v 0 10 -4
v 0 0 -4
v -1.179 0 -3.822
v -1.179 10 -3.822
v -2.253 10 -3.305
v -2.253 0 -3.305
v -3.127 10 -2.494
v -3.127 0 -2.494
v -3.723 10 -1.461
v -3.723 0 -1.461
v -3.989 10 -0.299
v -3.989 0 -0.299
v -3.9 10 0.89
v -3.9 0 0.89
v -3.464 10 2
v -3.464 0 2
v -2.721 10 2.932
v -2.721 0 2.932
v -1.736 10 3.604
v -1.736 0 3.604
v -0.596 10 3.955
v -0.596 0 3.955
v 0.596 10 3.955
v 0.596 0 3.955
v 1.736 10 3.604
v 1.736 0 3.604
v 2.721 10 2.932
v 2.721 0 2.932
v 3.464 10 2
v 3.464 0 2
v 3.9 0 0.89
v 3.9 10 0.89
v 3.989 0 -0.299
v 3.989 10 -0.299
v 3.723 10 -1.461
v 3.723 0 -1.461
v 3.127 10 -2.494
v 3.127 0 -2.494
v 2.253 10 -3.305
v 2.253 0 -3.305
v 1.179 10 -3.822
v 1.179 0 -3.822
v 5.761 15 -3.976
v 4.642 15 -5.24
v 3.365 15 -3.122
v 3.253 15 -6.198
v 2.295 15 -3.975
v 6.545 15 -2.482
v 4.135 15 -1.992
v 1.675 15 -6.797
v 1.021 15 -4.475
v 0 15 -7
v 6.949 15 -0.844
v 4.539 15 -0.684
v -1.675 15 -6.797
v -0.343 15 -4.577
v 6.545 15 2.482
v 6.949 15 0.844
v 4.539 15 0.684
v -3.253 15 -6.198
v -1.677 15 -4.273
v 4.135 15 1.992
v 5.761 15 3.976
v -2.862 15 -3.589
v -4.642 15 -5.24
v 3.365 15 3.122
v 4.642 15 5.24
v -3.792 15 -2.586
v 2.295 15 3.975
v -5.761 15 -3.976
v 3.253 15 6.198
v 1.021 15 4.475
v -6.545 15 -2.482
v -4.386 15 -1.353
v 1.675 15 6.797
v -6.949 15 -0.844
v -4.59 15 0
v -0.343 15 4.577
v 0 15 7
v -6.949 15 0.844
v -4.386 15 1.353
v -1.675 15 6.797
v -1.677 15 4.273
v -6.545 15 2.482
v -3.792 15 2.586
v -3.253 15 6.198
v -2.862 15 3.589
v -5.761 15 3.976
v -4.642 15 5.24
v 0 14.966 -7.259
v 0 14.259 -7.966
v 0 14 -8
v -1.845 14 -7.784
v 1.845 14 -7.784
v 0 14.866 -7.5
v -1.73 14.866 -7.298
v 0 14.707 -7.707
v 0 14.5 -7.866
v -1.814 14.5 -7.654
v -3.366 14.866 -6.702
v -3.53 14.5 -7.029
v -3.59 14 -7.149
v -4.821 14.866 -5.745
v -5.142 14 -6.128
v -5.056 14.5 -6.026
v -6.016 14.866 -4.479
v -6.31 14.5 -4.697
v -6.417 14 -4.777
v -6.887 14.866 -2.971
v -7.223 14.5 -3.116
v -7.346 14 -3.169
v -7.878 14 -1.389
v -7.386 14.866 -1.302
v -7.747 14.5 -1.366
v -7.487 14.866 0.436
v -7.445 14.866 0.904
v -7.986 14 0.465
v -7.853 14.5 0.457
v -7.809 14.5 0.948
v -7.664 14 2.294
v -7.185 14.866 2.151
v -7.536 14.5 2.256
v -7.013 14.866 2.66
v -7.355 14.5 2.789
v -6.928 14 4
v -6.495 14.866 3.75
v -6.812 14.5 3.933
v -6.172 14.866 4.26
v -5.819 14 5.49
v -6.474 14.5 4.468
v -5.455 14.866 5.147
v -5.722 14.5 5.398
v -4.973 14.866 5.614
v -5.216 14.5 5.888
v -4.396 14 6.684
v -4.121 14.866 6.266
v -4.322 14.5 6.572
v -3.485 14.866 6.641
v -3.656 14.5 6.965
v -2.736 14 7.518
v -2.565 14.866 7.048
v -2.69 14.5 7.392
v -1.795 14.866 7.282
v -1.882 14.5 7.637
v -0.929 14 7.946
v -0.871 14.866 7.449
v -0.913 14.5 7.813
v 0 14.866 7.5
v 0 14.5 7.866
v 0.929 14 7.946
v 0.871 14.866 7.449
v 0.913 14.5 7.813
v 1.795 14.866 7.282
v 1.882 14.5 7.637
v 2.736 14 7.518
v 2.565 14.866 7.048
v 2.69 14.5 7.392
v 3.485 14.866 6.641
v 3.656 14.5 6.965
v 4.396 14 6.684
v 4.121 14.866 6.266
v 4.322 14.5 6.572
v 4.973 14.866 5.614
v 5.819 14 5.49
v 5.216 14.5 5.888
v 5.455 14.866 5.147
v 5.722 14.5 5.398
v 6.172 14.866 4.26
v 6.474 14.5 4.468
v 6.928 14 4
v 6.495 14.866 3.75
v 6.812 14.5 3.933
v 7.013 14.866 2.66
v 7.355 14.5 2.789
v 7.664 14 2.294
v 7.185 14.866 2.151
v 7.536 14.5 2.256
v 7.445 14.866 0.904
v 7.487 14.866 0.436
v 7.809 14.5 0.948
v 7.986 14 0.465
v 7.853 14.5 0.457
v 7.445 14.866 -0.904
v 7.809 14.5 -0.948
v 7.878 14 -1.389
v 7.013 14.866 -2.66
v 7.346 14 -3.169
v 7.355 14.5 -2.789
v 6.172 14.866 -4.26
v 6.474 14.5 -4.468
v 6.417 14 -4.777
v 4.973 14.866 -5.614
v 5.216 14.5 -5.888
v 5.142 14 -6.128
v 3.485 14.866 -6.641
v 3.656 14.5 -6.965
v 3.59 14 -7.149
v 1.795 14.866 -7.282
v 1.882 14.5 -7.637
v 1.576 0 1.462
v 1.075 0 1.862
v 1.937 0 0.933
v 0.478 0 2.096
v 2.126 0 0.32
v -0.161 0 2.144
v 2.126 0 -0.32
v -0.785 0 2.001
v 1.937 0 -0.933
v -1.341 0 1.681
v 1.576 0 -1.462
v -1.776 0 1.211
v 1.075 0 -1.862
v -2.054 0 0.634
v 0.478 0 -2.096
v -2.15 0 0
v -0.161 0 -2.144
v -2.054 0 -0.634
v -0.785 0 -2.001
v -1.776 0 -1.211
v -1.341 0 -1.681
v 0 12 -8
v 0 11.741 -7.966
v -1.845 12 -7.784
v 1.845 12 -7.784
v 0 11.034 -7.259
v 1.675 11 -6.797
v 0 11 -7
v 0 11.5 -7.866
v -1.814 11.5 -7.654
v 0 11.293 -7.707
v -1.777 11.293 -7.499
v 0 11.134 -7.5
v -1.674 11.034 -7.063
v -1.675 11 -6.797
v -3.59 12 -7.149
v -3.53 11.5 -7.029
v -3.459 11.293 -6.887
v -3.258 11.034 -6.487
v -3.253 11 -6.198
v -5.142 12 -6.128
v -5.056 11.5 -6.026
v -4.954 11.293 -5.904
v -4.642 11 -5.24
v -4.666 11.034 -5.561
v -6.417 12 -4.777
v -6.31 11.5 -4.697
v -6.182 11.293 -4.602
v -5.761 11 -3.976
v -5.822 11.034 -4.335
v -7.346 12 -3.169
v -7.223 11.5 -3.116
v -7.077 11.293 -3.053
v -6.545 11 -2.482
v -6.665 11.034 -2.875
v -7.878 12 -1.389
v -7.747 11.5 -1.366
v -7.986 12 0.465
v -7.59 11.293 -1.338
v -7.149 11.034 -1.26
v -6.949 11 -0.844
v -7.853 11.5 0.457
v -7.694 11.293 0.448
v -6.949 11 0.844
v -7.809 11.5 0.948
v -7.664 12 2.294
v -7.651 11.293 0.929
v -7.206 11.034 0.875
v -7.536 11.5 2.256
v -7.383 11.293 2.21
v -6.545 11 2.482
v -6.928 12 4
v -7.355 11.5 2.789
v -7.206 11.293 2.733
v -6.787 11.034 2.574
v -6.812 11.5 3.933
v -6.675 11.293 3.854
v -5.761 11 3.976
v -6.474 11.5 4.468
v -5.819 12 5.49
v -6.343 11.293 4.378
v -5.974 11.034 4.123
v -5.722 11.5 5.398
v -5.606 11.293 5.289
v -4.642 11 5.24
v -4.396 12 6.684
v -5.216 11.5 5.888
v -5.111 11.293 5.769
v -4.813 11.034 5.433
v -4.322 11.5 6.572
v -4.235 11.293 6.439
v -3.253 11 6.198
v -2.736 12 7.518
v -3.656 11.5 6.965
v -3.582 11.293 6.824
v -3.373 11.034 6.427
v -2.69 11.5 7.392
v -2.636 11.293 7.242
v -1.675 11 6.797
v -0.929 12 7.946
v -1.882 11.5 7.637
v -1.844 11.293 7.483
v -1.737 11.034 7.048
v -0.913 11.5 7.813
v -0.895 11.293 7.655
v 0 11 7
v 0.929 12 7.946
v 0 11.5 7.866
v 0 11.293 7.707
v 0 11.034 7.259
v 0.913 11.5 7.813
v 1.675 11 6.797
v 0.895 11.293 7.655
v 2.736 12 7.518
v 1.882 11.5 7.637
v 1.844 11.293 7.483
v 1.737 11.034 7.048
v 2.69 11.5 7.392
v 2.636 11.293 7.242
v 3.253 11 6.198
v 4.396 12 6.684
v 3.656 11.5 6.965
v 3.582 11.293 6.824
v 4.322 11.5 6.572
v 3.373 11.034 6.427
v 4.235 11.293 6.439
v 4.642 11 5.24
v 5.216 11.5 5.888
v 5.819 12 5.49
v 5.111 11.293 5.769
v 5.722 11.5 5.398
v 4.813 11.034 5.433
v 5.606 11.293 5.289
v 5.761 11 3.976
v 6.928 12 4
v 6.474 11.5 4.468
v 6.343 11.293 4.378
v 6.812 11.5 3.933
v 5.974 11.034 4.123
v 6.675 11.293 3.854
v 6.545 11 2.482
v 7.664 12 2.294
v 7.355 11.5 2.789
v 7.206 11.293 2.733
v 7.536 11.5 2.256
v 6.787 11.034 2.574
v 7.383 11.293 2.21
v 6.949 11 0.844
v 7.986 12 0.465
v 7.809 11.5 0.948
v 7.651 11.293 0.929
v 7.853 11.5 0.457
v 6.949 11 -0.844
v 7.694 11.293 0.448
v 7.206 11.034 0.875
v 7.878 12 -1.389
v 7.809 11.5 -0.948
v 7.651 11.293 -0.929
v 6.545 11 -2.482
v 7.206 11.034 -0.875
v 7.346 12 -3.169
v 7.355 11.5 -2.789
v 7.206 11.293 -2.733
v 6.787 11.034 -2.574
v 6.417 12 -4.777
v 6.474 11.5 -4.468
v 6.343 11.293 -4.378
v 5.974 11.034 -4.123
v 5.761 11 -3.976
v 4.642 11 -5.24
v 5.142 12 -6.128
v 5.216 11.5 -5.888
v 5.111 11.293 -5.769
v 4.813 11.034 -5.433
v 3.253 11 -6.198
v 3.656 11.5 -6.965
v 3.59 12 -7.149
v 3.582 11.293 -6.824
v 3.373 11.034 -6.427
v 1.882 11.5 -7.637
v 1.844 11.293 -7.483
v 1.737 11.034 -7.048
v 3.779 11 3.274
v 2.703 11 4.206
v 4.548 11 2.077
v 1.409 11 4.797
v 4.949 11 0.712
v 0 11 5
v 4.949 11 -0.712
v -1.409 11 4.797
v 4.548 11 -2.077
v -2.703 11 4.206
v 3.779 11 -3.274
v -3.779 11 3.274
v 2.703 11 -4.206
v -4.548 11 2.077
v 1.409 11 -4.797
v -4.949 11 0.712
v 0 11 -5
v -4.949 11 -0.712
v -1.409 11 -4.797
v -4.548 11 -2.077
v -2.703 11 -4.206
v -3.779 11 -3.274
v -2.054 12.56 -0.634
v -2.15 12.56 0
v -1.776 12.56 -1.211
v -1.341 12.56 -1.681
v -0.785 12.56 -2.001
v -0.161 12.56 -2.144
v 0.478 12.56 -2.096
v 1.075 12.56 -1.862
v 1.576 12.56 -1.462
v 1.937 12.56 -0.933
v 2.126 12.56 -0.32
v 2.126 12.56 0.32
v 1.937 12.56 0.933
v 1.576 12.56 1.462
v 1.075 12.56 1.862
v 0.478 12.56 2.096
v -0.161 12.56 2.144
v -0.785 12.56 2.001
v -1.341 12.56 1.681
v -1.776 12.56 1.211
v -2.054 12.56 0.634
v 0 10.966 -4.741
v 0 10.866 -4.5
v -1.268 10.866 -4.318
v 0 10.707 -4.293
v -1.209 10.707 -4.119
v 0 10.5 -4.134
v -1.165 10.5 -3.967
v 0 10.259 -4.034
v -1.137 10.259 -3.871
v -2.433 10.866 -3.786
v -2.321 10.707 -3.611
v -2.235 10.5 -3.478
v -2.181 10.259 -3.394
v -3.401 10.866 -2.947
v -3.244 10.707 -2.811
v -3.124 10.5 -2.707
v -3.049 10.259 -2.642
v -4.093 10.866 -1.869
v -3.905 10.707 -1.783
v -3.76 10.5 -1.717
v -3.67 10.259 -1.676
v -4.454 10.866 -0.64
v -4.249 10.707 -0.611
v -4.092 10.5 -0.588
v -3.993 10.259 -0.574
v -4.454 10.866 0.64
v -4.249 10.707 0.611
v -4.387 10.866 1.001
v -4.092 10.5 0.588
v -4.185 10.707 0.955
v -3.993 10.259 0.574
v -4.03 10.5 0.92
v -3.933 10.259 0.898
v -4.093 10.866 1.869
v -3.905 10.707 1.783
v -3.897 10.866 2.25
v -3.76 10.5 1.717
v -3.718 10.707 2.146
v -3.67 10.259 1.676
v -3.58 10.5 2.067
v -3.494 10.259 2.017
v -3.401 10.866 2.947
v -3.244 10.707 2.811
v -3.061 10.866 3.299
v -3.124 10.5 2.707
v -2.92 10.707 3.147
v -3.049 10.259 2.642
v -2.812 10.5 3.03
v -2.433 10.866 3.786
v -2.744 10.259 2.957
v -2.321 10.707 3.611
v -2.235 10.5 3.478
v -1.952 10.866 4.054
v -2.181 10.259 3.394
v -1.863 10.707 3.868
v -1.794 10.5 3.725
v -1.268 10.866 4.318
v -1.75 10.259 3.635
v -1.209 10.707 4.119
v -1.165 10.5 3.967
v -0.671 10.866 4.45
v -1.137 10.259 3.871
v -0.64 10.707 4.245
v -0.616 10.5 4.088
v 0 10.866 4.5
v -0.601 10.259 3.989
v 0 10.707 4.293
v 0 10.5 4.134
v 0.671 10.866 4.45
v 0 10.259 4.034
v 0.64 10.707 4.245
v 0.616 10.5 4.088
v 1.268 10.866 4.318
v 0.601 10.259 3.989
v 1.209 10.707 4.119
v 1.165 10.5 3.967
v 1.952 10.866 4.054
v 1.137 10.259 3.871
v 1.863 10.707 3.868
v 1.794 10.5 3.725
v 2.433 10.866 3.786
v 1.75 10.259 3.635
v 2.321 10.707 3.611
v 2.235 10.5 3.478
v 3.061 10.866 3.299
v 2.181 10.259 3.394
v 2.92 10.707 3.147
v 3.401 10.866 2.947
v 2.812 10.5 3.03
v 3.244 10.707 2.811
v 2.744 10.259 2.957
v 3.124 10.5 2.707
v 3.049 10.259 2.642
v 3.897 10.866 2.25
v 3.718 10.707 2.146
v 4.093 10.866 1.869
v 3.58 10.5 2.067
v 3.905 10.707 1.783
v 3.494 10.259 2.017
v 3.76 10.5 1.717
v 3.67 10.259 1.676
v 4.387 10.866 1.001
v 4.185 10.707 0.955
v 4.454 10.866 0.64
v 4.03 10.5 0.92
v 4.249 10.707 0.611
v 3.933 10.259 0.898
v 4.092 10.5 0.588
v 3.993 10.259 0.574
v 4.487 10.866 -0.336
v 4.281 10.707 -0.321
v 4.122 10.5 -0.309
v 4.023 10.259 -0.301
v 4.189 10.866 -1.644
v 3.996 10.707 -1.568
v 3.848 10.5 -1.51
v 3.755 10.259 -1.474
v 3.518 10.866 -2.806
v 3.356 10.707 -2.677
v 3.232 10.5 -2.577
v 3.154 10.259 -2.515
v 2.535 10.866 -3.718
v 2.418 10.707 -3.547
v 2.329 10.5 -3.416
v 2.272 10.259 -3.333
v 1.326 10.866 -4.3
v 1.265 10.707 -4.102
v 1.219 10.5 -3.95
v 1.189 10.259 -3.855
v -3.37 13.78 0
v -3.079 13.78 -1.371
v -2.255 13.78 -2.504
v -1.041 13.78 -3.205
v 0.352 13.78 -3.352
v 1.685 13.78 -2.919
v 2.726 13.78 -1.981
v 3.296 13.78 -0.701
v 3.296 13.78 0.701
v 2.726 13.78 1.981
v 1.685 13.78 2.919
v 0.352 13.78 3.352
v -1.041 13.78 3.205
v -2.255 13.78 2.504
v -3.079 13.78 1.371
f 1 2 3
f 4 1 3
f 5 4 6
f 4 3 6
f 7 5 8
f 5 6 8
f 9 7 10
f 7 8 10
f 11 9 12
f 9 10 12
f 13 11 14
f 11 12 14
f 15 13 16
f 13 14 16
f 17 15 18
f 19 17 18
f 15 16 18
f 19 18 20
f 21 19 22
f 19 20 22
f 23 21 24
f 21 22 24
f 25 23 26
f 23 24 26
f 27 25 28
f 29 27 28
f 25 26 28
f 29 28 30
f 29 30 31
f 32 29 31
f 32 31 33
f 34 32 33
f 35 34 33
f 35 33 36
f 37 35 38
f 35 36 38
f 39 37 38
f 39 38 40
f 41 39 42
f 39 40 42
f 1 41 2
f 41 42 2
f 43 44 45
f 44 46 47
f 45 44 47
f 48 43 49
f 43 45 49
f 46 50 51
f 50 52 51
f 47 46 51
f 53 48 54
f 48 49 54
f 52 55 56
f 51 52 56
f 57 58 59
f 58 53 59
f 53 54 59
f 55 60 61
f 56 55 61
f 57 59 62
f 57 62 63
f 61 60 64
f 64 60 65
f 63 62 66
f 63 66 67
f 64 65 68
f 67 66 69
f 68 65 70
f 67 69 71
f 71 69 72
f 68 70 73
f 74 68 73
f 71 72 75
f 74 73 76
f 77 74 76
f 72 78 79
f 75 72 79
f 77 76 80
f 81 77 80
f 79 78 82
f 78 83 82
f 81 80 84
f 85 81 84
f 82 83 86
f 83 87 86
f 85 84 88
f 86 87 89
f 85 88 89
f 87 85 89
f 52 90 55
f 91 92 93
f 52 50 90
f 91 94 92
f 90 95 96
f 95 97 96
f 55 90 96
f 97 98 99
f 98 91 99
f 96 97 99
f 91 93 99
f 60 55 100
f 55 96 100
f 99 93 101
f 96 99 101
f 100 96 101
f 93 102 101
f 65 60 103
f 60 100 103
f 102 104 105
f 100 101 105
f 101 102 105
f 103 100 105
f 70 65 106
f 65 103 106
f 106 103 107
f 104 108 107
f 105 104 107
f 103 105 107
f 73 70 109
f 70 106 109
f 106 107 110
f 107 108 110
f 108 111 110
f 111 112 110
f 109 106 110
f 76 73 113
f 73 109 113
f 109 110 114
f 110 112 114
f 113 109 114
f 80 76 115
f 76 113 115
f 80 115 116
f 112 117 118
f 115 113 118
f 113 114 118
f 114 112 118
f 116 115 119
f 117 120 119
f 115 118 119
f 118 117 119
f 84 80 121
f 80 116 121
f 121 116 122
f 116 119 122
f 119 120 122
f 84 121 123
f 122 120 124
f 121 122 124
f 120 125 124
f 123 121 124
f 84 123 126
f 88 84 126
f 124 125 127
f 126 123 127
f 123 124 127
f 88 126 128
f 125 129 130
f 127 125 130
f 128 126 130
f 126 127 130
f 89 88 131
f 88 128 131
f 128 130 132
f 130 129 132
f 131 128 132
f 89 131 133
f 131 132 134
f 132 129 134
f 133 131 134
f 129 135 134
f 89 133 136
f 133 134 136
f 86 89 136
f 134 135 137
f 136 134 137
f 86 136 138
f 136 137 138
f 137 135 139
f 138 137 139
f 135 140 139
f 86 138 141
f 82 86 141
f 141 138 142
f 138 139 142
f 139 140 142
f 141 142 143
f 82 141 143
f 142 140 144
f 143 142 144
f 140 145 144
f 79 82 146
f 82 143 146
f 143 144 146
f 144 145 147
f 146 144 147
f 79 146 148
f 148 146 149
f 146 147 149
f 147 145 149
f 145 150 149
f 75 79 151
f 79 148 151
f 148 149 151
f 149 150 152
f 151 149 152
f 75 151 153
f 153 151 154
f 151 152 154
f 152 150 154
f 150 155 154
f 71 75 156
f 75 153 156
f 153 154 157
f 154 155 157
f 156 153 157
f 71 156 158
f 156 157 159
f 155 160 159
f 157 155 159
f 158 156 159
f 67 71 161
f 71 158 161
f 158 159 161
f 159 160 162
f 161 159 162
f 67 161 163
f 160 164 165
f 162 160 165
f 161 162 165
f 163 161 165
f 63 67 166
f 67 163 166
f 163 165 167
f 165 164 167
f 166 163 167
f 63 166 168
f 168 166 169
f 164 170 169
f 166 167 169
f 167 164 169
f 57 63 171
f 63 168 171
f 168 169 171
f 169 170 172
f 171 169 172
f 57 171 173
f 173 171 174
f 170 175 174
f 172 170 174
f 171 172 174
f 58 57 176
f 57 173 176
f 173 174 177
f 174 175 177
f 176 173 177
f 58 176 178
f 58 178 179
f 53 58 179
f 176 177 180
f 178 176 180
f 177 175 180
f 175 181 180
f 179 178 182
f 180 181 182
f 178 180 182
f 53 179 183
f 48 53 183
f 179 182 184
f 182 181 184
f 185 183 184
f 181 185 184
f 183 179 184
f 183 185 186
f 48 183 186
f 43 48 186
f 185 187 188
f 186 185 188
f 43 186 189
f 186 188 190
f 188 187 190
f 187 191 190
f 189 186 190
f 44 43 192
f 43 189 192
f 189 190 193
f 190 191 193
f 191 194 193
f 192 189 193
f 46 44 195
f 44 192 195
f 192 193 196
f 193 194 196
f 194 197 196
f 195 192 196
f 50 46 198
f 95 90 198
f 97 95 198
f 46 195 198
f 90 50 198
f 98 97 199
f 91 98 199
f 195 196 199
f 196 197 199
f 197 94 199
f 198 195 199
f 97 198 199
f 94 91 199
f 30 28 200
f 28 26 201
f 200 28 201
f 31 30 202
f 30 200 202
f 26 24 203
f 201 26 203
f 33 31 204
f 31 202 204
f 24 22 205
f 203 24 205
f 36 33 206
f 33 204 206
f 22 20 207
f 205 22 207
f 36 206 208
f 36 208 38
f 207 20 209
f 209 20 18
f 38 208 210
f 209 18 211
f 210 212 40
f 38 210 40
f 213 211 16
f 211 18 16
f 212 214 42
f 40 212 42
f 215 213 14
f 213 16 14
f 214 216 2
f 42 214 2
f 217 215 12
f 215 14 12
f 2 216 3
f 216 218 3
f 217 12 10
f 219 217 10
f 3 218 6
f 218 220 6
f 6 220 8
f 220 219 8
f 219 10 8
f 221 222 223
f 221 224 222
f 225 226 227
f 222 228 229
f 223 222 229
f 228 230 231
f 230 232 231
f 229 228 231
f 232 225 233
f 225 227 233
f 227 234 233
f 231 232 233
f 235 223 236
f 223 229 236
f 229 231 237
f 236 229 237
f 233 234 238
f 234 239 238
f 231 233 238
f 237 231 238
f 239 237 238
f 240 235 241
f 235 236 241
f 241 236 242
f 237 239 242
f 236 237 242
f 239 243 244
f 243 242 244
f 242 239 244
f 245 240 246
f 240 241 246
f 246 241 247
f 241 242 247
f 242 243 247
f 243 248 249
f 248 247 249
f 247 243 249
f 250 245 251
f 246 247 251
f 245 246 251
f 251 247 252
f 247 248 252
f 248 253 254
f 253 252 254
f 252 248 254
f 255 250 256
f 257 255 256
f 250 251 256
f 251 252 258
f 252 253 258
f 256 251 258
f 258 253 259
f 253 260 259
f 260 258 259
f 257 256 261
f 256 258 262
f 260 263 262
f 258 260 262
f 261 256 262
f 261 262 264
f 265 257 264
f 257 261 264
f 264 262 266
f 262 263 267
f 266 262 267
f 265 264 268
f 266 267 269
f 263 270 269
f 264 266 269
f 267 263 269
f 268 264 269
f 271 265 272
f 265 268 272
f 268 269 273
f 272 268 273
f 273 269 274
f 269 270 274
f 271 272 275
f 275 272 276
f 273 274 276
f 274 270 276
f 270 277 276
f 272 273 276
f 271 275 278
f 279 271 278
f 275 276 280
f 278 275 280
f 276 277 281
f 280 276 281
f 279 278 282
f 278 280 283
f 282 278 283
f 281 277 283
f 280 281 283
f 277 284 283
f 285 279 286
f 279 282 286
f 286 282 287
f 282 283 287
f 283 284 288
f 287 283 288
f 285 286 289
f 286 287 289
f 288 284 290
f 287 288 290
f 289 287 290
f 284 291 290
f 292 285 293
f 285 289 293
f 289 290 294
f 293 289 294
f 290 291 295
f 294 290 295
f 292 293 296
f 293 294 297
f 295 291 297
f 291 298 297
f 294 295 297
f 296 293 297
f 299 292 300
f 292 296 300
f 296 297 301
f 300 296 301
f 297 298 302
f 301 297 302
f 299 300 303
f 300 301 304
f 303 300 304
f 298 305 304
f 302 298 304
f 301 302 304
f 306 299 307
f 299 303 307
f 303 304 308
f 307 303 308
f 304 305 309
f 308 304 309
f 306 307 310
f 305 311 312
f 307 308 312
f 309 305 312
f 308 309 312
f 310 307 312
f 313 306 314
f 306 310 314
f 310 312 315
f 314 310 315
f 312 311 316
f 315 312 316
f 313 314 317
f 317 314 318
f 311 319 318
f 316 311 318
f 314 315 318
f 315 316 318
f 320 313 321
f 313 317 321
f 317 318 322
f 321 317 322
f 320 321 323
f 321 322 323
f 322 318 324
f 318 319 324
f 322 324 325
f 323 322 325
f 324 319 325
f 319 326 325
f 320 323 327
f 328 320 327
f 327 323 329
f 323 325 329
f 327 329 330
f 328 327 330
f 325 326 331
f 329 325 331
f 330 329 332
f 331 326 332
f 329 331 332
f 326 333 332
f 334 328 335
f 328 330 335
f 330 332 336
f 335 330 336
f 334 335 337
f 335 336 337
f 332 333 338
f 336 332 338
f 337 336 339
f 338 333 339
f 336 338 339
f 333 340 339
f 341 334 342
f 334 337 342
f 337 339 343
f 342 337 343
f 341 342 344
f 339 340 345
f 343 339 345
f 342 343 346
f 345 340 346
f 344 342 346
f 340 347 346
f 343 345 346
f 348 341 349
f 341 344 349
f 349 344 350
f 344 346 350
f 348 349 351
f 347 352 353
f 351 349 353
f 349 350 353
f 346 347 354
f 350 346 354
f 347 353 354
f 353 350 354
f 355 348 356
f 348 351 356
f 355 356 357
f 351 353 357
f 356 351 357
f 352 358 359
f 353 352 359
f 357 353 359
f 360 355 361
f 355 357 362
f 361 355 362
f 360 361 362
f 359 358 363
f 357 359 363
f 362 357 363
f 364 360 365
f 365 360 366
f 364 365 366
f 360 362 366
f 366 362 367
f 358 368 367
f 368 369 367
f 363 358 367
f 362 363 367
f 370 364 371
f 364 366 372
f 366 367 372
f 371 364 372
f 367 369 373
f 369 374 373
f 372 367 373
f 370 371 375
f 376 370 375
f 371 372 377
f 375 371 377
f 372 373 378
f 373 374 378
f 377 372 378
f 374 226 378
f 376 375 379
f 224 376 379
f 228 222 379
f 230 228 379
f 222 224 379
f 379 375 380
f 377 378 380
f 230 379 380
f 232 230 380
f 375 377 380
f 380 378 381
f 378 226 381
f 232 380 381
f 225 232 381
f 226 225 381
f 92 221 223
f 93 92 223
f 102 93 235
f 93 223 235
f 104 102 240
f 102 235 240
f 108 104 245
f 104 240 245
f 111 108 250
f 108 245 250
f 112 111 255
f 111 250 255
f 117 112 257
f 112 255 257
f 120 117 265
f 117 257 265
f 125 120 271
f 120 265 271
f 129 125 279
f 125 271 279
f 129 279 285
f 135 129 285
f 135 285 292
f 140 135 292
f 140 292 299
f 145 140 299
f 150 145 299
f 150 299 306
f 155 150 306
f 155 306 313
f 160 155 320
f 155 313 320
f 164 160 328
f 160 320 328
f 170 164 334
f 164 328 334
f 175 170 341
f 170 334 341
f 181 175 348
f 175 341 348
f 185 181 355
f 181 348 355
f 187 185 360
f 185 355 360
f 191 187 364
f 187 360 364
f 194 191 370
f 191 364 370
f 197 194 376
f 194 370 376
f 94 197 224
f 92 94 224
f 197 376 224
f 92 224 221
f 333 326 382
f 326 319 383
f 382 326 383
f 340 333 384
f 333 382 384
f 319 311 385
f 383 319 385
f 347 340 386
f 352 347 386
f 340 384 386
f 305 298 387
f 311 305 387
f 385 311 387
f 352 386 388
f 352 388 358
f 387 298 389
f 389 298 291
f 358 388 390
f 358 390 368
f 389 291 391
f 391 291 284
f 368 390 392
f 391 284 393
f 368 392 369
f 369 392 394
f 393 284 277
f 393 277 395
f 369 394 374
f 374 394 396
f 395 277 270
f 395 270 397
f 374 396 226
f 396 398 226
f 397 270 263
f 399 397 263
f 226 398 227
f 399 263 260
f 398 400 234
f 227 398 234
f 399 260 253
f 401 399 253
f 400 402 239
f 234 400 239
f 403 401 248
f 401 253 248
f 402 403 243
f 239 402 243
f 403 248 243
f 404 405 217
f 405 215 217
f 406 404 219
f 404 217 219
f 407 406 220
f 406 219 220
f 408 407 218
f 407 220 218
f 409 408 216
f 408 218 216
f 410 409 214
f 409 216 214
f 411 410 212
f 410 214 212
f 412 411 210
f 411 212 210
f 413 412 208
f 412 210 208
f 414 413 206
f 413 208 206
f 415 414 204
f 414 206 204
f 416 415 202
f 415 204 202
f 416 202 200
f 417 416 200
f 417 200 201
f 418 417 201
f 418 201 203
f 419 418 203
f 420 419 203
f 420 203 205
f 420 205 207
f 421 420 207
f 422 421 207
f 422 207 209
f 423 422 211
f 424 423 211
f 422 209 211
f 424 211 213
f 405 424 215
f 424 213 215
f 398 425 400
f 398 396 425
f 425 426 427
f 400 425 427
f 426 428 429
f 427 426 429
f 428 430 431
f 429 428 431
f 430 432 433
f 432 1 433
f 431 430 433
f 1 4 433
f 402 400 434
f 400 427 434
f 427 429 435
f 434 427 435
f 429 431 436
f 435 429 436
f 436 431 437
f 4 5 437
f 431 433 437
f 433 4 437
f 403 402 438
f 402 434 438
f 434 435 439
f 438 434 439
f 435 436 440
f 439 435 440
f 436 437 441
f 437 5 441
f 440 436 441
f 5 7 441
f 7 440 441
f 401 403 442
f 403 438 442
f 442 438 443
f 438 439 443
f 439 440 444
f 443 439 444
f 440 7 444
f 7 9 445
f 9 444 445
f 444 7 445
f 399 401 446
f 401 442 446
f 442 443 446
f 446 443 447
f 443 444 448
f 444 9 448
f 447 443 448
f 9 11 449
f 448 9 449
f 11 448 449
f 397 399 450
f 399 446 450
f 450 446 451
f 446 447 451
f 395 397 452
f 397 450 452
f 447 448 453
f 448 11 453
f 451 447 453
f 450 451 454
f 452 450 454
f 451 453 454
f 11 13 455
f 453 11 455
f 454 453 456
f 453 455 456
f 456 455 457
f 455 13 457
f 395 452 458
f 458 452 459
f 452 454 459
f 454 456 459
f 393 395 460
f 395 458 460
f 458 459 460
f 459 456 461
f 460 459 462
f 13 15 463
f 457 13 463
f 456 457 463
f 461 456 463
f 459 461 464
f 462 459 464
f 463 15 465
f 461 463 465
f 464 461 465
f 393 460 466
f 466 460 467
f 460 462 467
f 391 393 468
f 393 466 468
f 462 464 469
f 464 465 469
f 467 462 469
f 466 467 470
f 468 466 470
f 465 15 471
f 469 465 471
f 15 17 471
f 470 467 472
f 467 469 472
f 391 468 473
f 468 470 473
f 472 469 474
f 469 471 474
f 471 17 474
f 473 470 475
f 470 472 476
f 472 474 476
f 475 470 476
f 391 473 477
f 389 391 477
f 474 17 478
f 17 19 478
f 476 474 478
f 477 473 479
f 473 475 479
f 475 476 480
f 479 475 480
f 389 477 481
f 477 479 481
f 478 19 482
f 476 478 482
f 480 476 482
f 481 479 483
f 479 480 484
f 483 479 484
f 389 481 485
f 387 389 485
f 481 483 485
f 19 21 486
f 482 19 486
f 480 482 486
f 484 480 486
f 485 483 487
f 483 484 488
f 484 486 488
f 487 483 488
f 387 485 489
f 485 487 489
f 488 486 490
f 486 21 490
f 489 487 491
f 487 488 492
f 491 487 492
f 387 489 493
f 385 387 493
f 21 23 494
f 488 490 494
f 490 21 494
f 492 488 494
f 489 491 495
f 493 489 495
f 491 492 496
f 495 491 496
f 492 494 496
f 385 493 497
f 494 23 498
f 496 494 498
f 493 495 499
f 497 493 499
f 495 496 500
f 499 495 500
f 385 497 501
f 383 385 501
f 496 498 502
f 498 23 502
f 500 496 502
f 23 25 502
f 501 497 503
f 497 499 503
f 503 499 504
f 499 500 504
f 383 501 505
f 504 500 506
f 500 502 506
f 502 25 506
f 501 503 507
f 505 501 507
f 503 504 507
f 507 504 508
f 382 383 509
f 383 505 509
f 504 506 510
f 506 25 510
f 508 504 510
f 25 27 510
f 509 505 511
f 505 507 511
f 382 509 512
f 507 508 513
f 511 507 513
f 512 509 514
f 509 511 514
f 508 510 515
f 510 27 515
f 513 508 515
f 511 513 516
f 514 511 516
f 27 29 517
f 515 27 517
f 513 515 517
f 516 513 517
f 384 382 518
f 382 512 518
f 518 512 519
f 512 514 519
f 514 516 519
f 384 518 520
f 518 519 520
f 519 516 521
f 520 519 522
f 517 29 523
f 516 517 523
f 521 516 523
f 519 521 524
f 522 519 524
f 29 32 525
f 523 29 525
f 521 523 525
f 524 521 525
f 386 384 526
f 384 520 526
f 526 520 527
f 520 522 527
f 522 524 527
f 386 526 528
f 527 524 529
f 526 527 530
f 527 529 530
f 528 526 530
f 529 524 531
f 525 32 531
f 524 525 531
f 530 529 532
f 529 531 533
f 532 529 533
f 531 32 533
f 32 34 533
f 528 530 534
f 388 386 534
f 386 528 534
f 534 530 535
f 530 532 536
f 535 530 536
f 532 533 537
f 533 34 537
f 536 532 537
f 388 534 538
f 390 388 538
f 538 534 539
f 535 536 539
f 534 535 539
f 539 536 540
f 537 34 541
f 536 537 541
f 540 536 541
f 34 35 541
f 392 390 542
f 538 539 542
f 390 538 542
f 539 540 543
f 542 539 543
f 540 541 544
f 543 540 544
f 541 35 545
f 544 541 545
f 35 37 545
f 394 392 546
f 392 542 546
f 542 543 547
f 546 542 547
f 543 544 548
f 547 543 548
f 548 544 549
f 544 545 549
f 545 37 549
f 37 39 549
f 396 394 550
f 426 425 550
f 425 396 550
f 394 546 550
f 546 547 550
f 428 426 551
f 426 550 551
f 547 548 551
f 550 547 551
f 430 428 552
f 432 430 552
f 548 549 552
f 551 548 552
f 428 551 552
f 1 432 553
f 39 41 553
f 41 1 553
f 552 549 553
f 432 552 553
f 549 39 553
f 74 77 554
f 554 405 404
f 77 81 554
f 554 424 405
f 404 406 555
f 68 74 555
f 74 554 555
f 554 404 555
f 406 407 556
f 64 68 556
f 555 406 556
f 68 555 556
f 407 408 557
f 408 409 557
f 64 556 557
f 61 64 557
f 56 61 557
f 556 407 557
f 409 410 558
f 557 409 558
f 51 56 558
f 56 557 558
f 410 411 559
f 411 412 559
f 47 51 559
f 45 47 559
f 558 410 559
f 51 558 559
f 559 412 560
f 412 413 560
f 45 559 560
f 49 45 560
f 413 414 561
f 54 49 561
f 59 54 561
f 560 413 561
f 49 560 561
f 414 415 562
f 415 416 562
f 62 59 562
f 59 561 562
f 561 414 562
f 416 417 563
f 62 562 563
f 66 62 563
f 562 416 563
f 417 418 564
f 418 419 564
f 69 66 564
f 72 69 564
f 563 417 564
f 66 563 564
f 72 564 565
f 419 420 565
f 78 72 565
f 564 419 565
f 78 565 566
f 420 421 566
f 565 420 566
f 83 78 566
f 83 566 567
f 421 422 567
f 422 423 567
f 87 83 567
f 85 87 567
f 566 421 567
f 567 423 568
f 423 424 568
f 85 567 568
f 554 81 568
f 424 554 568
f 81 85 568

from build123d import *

# Parameters (mm, degrees)
REDONDEO1_R                                          = 1
AVELLANADO_PARA_TORNILLO_CON_CABEZA_AVEL_D           = 4.3
AVELLANADO_PARA_TORNILLO_CON_CABEZA_AVEL_CSINK_D     = 9.18
AVELLANADO_PARA_TORNILLO_CON_CABEZA_AVEL_CSINK_ANGLE = 90


with BuildPart() as part:
    # Croquis1 → Revolución1 (revolve)
    with BuildSketch(Plane.XY, mode=Mode.PRIVATE) as revoluci_n1_sk:
        Polygon((0, 15), (8, 15), (8, 11), (4, 11), (4, 0), (0, 0), align=None)
    revolve(revoluci_n1_sk.sketch.rotate(Axis((0, 0, 0), (0, 1, 0)), 90), axis=Axis((0, 0, 0), (0, 1, 0)))

    # Redondeo1
    redondeo1_edges = [part.edges().sort_by_distance(p)[0] for p in [
        (0, 11, 4),
        (0, 11, 8),
        (0, 15, 8),
    ]]
    fillet(redondeo1_edges, radius=REDONDEO1_R)

    # Avellanado para tornillo con cabeza avellanada de clavija hexagonal de M41 (through all)
    with Locations(Plane(origin=(0, 15, 0), x_dir=(1, 0, 0), z_dir=(0, 1, 0))):
        with Locations((0, 0)):
            CounterSinkHole(AVELLANADO_PARA_TORNILLO_CON_CABEZA_AVEL_D / 2, AVELLANADO_PARA_TORNILLO_CON_CABEZA_AVEL_CSINK_D / 2, counter_sink_angle=AVELLANADO_PARA_TORNILLO_CON_CABEZA_AVEL_CSINK_ANGLE)


solid = part.part
